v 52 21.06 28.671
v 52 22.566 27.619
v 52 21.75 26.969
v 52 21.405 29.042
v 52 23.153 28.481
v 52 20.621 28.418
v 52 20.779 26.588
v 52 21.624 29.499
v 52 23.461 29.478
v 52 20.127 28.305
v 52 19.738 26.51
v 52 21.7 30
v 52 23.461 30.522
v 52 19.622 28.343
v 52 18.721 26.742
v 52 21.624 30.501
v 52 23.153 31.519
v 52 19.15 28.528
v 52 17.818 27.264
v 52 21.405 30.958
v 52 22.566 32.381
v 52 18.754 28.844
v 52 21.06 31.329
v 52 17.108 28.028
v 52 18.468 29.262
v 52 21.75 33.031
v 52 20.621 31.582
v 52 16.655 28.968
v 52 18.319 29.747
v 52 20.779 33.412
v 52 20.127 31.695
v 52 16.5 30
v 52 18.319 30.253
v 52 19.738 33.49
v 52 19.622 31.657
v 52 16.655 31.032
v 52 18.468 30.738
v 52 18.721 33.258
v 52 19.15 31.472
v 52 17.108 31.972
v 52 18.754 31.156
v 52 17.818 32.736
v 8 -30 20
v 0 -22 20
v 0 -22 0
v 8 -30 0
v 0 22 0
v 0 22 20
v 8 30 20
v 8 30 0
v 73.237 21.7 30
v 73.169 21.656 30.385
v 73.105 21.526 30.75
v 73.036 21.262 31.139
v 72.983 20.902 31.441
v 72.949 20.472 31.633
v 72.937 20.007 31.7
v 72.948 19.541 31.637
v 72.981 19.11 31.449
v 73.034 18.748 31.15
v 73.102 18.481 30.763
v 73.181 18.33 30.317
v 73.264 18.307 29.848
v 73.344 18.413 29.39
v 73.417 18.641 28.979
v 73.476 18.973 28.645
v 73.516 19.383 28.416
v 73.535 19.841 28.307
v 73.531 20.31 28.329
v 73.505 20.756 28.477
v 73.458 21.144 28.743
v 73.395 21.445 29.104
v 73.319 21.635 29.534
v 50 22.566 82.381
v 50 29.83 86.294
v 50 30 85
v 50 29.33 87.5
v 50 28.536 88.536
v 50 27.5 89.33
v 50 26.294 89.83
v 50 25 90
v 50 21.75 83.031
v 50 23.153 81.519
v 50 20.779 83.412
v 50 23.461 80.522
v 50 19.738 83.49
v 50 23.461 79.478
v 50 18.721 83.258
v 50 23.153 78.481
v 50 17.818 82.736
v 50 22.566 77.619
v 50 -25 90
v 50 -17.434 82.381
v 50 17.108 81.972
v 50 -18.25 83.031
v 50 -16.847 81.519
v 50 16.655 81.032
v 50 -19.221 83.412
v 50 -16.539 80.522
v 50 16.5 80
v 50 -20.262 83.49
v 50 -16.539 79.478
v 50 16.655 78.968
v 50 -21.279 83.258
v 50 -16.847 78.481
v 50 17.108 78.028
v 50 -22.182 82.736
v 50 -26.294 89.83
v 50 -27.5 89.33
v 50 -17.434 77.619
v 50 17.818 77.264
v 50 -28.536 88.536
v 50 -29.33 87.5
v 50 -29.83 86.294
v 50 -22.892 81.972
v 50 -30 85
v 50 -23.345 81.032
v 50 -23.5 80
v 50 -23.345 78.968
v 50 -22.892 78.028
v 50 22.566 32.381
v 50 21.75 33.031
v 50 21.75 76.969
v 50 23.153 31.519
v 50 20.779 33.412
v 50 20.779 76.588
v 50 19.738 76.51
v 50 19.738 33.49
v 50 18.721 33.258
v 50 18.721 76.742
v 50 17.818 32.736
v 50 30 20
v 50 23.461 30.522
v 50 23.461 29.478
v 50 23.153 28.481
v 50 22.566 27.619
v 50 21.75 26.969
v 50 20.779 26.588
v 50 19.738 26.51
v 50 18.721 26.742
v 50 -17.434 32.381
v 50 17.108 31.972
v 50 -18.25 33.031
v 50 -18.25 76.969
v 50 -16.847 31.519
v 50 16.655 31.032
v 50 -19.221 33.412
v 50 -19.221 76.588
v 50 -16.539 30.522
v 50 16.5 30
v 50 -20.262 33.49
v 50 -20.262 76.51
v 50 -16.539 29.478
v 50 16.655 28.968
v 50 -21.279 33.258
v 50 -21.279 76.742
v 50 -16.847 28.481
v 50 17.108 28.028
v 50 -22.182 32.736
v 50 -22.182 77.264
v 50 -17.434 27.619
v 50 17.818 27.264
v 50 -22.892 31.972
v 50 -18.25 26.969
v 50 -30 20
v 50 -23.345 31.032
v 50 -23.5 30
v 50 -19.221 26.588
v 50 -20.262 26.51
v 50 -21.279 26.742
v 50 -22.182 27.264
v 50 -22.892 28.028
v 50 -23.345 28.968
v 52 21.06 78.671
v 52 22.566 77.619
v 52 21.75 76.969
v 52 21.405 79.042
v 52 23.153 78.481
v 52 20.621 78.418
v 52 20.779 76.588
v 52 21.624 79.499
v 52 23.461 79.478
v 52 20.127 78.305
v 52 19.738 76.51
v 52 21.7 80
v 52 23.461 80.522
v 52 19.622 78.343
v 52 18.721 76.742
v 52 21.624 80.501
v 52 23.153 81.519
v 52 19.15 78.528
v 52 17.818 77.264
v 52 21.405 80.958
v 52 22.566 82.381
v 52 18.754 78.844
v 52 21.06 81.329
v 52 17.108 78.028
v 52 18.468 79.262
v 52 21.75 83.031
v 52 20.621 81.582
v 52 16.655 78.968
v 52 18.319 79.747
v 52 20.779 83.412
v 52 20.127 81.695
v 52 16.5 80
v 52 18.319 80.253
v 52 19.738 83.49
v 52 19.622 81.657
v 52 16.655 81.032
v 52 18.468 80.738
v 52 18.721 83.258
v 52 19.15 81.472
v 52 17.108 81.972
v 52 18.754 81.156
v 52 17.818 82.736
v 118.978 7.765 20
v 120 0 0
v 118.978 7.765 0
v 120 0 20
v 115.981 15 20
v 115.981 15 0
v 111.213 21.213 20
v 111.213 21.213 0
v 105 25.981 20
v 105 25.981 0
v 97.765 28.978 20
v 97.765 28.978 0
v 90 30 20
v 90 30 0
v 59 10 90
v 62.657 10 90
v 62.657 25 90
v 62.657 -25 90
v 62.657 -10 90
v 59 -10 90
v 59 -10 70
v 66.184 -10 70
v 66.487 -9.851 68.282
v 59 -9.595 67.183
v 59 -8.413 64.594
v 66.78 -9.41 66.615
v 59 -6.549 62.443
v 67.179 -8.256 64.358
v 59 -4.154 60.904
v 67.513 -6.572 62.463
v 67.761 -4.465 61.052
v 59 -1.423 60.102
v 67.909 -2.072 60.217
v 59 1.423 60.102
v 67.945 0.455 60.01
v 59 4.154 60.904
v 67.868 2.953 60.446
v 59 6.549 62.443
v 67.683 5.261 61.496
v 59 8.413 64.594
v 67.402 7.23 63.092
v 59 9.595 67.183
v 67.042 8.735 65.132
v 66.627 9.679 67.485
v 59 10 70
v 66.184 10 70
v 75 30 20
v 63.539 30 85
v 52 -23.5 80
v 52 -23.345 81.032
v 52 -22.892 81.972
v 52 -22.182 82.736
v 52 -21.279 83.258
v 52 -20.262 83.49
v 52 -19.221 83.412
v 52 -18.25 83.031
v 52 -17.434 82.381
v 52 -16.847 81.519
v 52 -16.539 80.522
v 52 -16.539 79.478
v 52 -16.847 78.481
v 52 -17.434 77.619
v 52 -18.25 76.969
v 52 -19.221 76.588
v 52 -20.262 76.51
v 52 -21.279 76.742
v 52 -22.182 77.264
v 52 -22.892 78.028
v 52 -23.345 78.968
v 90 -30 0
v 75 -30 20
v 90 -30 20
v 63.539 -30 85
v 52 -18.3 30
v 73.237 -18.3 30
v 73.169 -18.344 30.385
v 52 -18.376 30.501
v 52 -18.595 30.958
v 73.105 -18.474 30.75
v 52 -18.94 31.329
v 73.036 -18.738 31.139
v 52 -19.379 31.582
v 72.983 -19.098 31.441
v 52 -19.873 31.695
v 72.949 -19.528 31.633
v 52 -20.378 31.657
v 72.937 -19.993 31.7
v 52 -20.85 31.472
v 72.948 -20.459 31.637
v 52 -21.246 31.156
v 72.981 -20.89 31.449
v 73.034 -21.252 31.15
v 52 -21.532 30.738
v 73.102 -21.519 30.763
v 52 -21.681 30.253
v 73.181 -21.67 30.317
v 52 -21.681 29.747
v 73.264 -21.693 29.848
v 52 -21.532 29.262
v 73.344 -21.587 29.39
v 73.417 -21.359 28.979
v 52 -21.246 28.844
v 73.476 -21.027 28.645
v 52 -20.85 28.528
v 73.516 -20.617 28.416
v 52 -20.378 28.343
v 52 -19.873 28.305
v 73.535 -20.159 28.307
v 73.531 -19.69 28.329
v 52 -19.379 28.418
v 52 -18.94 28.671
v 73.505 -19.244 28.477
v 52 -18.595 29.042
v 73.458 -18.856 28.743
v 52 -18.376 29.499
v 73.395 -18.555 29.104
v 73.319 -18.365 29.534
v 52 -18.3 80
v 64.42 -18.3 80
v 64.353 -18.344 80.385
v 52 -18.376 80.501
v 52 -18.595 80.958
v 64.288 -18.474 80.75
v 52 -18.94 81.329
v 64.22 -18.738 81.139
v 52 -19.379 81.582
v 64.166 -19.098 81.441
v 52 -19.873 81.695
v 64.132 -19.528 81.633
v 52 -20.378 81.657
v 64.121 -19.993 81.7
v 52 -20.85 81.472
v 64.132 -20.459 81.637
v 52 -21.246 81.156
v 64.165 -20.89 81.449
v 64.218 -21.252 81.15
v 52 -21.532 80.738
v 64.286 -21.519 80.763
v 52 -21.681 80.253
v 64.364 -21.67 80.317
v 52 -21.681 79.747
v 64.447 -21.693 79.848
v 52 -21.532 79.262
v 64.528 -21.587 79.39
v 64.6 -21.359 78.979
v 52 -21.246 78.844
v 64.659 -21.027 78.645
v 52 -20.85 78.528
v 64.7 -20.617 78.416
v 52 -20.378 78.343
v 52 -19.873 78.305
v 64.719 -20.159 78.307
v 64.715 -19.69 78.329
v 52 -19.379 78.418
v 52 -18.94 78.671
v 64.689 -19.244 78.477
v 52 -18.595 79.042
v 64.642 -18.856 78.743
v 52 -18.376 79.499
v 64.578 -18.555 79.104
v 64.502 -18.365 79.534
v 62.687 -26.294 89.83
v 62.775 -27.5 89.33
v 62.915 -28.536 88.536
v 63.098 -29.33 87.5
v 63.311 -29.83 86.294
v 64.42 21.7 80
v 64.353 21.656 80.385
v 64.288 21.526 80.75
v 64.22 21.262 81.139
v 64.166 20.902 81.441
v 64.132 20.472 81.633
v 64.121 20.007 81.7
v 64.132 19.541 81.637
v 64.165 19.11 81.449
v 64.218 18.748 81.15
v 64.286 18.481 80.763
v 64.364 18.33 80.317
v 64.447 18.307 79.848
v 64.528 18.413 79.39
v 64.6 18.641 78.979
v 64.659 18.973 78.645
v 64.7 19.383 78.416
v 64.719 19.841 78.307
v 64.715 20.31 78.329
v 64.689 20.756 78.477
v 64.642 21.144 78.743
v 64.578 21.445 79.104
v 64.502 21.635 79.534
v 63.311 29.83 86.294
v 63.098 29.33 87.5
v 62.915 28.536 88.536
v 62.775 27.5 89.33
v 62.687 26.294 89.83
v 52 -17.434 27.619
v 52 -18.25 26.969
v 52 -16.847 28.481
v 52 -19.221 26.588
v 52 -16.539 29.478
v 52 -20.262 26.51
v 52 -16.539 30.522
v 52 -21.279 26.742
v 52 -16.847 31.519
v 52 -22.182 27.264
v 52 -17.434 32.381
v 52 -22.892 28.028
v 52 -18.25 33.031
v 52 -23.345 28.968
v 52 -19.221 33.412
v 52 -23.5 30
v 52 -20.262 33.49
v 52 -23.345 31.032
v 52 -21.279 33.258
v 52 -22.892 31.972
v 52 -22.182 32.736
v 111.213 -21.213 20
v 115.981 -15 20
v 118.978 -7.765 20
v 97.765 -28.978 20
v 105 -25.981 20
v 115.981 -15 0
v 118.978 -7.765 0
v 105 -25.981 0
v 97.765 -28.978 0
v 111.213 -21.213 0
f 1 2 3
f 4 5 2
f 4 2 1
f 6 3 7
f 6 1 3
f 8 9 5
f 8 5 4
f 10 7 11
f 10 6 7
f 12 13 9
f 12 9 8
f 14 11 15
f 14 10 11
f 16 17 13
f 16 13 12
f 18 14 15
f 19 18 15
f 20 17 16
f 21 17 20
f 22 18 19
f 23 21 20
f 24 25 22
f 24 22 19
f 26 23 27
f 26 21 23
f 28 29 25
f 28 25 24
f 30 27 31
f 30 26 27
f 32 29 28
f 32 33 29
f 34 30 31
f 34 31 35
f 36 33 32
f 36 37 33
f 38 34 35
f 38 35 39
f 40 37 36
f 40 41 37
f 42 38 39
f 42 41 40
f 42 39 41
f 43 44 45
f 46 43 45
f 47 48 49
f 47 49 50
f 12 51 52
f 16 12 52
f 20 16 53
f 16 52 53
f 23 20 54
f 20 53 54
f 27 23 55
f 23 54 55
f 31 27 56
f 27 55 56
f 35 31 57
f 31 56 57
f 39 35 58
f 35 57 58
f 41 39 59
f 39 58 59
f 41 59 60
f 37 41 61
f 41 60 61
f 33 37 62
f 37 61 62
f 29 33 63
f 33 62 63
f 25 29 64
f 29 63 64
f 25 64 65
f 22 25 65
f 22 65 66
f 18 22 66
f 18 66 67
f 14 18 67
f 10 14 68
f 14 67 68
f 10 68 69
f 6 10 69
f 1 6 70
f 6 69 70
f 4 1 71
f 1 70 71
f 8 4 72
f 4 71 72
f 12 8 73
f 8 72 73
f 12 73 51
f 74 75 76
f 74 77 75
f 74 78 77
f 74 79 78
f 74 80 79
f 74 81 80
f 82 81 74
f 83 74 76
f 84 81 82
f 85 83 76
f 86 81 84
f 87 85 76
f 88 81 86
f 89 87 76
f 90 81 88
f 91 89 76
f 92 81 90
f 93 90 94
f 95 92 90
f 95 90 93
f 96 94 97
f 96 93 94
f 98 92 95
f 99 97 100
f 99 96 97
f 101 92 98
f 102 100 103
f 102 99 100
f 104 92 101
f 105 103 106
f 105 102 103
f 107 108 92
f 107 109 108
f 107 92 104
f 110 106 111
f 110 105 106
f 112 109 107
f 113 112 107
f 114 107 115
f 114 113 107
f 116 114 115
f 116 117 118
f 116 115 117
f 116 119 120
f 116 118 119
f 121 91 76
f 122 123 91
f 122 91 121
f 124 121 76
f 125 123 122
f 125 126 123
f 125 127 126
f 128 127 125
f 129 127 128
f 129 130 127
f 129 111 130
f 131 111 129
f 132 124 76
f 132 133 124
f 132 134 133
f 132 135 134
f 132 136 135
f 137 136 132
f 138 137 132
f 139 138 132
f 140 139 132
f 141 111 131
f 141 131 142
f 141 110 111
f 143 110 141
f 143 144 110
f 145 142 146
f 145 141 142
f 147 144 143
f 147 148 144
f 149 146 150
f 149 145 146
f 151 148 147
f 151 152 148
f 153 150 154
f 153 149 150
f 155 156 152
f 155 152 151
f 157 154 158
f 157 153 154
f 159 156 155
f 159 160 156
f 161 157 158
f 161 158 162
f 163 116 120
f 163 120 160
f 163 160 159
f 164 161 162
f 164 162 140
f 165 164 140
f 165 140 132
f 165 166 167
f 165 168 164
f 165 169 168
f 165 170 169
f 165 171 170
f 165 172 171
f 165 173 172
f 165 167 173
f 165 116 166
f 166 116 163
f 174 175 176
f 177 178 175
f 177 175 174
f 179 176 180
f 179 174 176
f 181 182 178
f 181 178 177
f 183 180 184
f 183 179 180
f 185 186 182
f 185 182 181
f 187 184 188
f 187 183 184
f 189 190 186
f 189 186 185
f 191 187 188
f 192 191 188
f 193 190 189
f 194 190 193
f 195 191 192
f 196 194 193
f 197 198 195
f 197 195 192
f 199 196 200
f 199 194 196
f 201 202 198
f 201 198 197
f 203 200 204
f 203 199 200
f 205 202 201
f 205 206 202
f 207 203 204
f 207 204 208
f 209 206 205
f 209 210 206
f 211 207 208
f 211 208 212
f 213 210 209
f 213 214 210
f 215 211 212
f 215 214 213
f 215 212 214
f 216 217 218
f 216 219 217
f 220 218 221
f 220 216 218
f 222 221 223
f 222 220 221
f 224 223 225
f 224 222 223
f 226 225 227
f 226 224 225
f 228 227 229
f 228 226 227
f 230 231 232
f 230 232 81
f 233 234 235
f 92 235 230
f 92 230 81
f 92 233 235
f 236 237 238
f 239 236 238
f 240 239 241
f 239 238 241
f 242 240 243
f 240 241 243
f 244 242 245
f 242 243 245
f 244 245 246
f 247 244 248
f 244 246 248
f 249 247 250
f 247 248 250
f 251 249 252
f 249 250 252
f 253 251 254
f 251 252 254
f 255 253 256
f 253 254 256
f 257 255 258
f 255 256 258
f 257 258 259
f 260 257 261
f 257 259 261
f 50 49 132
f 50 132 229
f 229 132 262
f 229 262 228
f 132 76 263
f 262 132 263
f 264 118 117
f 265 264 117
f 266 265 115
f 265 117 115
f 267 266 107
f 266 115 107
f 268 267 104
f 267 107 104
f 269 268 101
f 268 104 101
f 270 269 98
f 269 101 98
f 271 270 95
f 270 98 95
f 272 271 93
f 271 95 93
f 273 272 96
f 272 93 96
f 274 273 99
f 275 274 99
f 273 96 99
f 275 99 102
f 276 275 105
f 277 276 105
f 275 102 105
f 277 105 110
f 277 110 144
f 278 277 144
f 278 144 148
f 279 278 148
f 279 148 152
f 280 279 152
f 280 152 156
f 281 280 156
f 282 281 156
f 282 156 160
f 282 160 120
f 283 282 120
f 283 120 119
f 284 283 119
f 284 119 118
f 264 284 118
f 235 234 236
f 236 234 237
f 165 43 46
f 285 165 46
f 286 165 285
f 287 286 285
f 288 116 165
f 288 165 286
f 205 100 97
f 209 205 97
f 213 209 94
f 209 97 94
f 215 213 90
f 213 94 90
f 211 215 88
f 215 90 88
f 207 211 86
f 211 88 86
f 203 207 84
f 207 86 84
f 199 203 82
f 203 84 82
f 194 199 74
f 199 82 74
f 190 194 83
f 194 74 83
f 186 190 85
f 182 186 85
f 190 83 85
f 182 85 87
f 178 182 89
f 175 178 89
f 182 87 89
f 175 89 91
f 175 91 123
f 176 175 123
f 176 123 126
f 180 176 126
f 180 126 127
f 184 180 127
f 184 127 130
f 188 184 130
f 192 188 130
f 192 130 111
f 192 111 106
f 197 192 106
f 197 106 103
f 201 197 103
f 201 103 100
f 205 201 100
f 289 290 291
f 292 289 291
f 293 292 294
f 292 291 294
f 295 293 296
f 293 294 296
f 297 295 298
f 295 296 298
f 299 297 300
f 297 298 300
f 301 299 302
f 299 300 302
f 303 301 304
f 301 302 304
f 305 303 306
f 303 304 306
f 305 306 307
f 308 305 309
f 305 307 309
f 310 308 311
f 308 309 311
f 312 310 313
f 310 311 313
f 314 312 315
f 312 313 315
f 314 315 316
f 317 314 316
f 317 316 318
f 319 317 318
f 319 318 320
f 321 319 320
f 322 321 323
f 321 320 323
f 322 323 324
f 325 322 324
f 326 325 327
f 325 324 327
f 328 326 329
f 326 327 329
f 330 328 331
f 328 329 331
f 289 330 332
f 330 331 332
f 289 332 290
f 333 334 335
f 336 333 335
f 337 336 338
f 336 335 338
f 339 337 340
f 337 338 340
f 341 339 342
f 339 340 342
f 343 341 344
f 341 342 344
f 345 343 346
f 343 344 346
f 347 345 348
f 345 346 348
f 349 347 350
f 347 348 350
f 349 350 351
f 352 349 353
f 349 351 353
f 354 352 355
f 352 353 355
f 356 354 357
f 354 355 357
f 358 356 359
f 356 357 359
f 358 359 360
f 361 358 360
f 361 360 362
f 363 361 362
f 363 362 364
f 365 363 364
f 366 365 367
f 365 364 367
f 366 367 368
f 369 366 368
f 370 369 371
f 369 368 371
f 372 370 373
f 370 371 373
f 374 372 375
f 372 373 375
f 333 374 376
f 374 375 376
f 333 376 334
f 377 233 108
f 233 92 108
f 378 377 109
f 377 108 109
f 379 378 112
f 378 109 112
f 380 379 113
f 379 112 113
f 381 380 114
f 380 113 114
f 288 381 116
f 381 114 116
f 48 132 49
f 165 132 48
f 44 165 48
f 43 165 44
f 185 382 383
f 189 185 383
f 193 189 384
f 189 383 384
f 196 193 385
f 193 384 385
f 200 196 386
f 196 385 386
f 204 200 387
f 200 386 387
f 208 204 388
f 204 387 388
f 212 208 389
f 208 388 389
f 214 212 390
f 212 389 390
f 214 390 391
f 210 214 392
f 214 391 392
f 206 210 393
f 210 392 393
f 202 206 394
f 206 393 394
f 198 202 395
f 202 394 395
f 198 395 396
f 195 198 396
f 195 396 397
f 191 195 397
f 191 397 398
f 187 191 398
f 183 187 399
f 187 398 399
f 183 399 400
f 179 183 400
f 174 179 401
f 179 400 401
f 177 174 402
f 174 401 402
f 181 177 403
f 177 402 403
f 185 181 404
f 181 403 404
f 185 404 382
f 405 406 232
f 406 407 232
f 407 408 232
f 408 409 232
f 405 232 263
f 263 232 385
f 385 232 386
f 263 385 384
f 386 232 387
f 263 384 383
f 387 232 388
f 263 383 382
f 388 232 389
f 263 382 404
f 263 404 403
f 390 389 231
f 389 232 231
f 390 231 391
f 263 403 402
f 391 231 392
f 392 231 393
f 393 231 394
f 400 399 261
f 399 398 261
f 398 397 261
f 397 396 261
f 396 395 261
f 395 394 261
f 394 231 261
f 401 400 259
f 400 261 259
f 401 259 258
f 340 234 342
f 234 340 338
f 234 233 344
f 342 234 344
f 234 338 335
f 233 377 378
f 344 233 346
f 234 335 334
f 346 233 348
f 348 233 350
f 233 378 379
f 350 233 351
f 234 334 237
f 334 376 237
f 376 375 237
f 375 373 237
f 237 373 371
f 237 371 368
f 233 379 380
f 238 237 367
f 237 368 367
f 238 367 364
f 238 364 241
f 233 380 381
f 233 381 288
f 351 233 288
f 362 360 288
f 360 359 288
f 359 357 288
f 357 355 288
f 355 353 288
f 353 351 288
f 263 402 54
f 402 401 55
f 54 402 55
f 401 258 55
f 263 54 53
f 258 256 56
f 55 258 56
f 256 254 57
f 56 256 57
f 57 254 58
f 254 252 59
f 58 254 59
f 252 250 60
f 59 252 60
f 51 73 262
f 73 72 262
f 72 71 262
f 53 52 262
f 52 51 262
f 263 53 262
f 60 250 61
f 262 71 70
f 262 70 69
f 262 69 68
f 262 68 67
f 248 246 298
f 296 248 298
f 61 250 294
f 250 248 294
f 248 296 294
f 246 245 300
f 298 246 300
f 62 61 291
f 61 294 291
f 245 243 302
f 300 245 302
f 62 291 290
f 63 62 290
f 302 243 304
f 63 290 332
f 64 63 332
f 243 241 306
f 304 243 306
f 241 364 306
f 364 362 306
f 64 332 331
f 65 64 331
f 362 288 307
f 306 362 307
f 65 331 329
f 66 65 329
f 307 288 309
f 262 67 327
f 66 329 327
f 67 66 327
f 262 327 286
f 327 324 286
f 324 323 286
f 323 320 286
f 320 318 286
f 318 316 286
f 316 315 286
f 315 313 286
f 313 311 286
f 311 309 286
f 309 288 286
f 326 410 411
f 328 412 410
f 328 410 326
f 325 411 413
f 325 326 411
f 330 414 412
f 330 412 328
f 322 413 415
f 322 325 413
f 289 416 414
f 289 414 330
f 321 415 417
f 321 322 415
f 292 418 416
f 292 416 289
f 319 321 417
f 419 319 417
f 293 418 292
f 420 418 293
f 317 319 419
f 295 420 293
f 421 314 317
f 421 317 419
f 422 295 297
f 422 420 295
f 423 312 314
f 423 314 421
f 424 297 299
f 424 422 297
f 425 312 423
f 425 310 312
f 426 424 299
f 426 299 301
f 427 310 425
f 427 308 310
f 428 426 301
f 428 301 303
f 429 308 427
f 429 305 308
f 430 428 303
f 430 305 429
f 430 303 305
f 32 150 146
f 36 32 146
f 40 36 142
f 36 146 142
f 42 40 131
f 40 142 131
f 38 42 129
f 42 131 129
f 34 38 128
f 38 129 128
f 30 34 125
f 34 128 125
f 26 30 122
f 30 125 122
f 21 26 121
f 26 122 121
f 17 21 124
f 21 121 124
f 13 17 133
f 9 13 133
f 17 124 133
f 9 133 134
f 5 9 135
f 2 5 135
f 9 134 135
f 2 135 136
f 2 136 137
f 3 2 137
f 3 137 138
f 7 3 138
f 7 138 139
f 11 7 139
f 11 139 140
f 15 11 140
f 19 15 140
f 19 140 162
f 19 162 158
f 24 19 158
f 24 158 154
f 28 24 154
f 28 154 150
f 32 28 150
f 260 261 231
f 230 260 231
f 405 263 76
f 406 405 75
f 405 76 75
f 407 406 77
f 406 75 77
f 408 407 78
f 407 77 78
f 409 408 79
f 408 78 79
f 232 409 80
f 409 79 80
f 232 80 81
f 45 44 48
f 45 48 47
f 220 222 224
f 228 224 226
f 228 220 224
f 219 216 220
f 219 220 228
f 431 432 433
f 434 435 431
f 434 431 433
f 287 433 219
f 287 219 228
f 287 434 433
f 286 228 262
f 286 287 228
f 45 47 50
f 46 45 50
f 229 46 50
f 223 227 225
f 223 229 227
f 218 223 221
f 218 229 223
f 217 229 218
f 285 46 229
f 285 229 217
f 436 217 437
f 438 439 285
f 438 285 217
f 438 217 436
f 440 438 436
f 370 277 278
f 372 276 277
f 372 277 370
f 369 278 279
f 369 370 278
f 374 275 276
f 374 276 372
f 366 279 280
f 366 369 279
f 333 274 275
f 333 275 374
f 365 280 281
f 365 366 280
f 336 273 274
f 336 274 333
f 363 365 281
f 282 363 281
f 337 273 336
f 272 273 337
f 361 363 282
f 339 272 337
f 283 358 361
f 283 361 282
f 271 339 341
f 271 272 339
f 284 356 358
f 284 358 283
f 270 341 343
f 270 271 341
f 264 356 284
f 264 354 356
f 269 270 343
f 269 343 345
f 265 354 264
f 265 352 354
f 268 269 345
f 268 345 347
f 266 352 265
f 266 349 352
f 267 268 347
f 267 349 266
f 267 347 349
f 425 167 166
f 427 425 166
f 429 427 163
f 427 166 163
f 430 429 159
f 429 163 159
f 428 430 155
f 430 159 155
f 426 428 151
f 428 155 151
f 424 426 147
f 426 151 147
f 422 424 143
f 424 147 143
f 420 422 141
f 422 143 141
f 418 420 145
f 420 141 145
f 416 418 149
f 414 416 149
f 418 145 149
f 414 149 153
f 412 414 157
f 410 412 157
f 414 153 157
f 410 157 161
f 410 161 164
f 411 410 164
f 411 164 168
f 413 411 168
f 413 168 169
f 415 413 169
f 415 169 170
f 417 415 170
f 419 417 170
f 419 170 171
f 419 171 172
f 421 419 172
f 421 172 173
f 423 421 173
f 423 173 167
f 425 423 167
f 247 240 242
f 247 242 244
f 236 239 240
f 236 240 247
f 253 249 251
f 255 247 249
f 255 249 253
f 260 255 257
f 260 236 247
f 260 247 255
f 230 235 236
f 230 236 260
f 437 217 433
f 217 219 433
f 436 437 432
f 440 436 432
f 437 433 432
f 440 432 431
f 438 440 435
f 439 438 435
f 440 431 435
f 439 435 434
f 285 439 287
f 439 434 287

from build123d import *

# Parameters (mm, degrees)
F1_DEPTH       = 30
F2_R           = 29.99999
F4_D           = 3.4
F4_CBORE_D     = 7
F4_CBORE_DEPTH = 2
F5_SIZE        = 8
F10_DEPTH      = 16
F11_DEPTH      = 60.001
F12_R          = 5


# Not quite as in the source:
# - a fillet or chamfer is up to 0.001 mm smaller than in the source, because OpenCascade refuses the exact size


with BuildPart() as f1:
    # F0 (on Front) → F1 (new body, symmetric)
    with BuildSketch(Plane.XZ):
        Polygon((0, 20), (0, 0), (120, 0), (120, 20), (75, 20), (75, 90), (50, 90), (50, 20), align=None)
    extrude(amount=F1_DEPTH, both=True)

    # F2 (radius 30 in the source; OpenCascade refuses exactly that, so slightly less here)
    f2_edges = [f1.edges().sort_by_distance(p)[0] for p in [
        (120, -30, 10),
        (120, 30, 10),
    ]]
    fillet(f2_edges, radius=F2_R)

    # F4 (through all)
    with Locations(Plane(origin=(50, 0, 0), x_dir=(0, -1, 0), z_dir=(-1, 0, 0))):
        with Locations((-20, 80), (-20, 30), (20, 30), (20, 80)):
            CounterBoreHole(F4_D / 2, F4_CBORE_D / 2, F4_CBORE_DEPTH)

    # F5
    f5_edges = [f1.edges().sort_by_distance(p)[0] for p in [
        (0, 30, 10),
        (0, -30, 10),
    ]]
    chamfer(f5_edges, length=F5_SIZE)

    # F7 (on face) → F10 (cut, through all)
    with BuildSketch(Plane.YZ.offset(75)):
        with BuildLine():
            ThreePointArc((-10, 70), (0, 80), (10, 70))
            Line((10, 70), (10, 90))
            Line((10, 90), (-10, 90))
            Line((-10, 90), (-10, 70))
        make_face()
        with BuildLine():
            ThreePointArc((-10, 70), (0, 60), (10, 70))
            ThreePointArc((10, 70), (0, 80), (-10, 70))
        make_face()
    extrude(amount=-F10_DEPTH, mode=Mode.SUBTRACT)

    # F6 (on face) → F11 (cut, through all)
    with BuildSketch(Plane.XZ.offset(30)):
        Polygon((62.6571113504, 90), (75, 20), (75, 90), align=None)
    extrude(amount=-F11_DEPTH, mode=Mode.SUBTRACT)

    # F12
    f12_edges = [f1.edges().sort_by_distance(p)[0] for p in [
        (56.328556, -30, 90),
        (56.328556, 30, 90),
    ]]
    fillet(f12_edges, radius=F12_R)


solid = f1.part
